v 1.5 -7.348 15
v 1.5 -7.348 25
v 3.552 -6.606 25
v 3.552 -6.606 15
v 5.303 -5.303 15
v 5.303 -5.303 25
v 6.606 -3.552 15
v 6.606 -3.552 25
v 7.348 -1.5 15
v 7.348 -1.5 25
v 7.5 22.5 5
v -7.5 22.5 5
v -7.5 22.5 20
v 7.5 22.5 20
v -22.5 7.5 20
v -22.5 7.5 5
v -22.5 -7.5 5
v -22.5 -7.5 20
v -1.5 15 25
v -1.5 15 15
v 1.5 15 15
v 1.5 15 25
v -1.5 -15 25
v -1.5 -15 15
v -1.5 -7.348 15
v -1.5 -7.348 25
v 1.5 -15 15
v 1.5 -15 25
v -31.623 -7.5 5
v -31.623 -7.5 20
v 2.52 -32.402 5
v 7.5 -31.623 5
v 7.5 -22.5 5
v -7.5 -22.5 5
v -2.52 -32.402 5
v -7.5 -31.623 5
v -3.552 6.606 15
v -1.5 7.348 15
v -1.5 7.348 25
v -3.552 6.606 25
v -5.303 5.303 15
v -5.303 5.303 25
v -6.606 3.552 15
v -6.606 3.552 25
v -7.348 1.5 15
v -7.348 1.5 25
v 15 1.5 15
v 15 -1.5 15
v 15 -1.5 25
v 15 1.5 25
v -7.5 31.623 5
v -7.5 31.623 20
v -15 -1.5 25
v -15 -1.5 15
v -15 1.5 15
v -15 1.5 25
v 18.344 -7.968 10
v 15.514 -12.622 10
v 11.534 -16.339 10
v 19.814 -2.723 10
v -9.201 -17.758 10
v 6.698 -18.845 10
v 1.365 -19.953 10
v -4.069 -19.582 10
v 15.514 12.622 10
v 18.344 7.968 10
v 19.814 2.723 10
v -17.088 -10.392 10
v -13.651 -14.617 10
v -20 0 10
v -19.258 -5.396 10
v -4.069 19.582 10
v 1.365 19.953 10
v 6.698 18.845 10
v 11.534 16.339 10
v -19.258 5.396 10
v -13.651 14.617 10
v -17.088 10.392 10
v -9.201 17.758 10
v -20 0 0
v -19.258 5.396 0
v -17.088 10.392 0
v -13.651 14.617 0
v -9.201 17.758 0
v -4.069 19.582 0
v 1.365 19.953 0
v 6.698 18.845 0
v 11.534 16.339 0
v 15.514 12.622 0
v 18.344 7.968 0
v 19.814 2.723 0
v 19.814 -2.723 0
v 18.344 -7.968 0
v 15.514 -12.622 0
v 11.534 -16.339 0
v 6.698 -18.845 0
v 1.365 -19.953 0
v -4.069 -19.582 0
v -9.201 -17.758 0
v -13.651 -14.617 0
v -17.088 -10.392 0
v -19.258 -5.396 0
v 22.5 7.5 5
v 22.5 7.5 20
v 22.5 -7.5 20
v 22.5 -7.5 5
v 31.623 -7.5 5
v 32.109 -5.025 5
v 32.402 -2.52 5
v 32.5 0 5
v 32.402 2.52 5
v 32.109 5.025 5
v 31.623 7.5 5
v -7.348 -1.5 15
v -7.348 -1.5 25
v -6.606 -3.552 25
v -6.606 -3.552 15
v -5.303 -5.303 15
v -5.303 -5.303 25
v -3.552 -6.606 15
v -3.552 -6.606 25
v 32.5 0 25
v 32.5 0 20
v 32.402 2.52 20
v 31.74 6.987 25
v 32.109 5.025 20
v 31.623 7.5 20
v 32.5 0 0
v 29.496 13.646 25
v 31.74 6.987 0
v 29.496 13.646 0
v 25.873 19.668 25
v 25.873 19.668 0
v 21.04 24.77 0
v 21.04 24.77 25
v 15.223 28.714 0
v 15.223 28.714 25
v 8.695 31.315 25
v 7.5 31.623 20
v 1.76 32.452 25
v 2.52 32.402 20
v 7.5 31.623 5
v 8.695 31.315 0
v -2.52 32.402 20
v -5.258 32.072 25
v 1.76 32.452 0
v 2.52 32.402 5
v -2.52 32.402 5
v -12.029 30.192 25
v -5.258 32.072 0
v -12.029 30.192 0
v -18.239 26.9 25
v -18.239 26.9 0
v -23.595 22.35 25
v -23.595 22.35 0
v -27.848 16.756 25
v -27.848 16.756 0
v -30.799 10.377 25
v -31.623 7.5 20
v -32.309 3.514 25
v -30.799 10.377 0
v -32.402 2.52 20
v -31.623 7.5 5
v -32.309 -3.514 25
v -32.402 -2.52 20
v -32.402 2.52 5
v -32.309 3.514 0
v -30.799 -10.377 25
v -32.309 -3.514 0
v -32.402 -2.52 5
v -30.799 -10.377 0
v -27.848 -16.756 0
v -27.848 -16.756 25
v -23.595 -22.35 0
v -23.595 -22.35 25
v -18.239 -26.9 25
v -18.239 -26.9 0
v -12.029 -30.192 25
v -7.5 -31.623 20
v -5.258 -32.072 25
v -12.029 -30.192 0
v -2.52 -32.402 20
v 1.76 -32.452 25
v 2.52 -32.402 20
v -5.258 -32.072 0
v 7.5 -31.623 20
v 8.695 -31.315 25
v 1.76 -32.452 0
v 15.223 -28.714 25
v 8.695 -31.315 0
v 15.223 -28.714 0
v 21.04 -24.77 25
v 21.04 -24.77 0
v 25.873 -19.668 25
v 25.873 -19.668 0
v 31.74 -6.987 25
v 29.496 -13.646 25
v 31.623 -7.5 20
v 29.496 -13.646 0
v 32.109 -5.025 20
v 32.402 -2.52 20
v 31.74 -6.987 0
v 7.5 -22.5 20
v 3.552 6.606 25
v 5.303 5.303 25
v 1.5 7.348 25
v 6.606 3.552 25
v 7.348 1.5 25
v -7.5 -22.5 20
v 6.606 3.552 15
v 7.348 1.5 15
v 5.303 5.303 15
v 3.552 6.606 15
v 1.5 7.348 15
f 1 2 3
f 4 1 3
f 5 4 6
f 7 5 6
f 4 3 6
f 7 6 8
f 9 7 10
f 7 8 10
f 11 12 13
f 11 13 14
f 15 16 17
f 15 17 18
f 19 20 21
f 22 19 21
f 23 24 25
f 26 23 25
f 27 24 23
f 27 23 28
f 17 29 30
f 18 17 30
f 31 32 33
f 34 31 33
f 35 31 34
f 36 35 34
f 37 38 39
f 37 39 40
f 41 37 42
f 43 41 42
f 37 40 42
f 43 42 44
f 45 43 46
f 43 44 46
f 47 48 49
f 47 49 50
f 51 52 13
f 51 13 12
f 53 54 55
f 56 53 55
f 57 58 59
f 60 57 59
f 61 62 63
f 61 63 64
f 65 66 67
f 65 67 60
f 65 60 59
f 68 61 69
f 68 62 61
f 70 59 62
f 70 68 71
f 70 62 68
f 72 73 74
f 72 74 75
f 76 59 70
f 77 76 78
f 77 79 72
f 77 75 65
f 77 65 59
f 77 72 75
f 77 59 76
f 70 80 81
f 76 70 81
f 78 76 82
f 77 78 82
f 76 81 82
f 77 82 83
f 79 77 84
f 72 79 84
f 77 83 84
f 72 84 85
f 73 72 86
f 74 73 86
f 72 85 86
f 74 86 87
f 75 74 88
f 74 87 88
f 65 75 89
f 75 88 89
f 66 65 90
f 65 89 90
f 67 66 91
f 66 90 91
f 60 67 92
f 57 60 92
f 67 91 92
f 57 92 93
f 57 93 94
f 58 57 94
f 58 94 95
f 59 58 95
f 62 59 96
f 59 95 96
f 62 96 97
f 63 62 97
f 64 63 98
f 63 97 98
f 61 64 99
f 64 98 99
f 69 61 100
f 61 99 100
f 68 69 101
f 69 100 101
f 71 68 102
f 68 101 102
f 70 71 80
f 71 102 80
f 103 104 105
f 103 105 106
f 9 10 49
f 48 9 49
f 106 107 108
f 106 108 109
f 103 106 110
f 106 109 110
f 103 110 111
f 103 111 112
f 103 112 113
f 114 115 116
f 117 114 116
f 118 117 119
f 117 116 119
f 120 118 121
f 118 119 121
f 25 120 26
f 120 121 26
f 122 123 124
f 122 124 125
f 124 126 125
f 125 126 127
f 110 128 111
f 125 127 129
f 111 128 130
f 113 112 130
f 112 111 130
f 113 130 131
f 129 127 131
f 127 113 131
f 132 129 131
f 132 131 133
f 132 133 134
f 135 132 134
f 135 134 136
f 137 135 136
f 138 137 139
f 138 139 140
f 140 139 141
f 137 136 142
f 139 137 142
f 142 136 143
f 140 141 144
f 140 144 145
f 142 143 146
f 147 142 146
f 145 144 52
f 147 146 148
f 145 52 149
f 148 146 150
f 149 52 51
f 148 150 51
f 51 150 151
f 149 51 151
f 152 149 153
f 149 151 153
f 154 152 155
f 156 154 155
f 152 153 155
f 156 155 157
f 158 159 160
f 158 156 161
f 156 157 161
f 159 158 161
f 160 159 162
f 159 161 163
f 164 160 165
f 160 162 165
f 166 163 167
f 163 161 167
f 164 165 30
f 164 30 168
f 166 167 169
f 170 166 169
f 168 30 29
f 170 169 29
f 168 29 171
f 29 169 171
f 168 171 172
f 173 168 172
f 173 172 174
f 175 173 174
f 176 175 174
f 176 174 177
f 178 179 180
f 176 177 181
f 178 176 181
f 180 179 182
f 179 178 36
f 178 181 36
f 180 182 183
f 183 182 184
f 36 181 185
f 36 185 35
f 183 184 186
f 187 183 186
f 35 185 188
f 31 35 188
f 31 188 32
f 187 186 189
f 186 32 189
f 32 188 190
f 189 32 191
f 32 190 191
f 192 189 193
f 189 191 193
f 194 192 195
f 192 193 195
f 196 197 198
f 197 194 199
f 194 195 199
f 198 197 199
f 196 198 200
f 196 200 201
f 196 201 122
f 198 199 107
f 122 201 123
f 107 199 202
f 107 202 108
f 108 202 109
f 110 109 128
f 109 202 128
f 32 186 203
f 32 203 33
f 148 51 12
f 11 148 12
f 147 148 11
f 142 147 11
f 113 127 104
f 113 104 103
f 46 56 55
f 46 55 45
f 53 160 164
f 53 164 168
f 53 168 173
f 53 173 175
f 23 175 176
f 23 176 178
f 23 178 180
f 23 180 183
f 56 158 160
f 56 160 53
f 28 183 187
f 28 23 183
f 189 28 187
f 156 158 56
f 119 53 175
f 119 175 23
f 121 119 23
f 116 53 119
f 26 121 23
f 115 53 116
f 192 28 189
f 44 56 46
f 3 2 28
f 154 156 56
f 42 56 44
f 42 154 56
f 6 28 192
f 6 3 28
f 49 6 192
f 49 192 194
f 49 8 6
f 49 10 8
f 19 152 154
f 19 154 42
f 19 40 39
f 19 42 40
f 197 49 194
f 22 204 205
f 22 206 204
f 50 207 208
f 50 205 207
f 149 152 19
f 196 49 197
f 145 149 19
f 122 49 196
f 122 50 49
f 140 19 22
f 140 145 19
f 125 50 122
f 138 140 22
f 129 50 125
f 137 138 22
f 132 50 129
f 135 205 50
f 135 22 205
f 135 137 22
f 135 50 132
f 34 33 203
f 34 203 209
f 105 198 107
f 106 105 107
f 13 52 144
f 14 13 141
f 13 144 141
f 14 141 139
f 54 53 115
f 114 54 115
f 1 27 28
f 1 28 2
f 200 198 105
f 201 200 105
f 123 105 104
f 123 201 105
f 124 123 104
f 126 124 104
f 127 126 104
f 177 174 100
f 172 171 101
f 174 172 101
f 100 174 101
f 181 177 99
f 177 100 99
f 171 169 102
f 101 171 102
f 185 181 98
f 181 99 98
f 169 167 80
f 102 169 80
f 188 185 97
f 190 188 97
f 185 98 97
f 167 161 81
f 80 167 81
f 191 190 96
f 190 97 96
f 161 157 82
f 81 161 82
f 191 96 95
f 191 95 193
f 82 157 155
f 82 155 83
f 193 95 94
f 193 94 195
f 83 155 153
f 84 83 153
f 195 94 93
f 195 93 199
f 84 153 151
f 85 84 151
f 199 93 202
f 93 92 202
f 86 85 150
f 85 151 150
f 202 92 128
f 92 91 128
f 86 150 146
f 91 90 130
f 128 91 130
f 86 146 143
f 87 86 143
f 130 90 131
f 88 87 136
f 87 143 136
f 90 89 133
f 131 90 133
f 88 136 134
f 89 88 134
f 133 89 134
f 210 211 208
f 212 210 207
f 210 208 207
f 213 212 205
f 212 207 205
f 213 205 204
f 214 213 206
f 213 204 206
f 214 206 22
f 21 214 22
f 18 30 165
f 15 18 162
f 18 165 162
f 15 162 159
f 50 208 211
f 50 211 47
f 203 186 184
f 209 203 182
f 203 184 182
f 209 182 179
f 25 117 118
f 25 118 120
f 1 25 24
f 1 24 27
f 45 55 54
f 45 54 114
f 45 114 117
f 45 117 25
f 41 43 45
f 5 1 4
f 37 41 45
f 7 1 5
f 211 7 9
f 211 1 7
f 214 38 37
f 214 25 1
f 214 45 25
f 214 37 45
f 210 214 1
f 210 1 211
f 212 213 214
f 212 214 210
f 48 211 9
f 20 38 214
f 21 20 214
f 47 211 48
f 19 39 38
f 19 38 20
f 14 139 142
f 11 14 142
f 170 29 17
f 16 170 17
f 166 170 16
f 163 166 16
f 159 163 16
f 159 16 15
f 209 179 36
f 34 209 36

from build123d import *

# Parameters (mm, degrees)
SKETCH1_R           = 32.5
BOSS_EXTRUDE1_DEPTH = 25
SKETCH2_R           = 20
CUT_EXTRUDE1_DEPTH  = 10
SKETCH3_R           = 7.5
SKETCH3_W           = 30
SKETCH3_H           = 3
SKETCH3_W_2         = 3
SKETCH3_H_2         = 30
CUT_EXTRUDE2_DEPTH  = 10
SKETCH4_W           = 15
SKETCH4_H           = 15
CUT_EXTRUDE3_DEPTH  = 10
SKETCH6_W           = 15
SKETCH6_H           = 15
CUT_EXTRUDE4_DEPTH  = 10
SKETCH7_W           = 15
SKETCH7_H           = 15
CUT_EXTRUDE5_DEPTH  = 10
SKETCH8_W           = 15
SKETCH8_H           = 15
CUT_EXTRUDE6_DEPTH  = 10


with BuildPart() as part:
    # Sketch1 → Boss-Extrude1 (new body)
    with BuildSketch(Plane.XY):
        Circle(SKETCH1_R)
    extrude(amount=BOSS_EXTRUDE1_DEPTH)

    # Sketch2 → Cut-Extrude1 (cut)
    with BuildSketch(Plane(origin=(0, 0, 0), x_dir=(-1, 0, 0), z_dir=(0, 0, -1))):
        Circle(SKETCH2_R)
    extrude(amount=-CUT_EXTRUDE1_DEPTH, mode=Mode.SUBTRACT)

    # Sketch3 → Cut-Extrude2 (cut)
    with BuildSketch(Plane.XY.offset(25)):
        Circle(SKETCH3_R)
        Rectangle(SKETCH3_W, SKETCH3_H)
        Rectangle(SKETCH3_W_2, SKETCH3_H_2)
    extrude(amount=-CUT_EXTRUDE2_DEPTH, mode=Mode.SUBTRACT)

    # Sketch4 → Cut-Extrude3 (cut)
    with BuildSketch(Plane(origin=(32.5, 0, 0), x_dir=(0, 0, -1), z_dir=(1, 0, 0))):
        with Locations((-12.5, 0)):
            Rectangle(SKETCH4_W, SKETCH4_H)
    extrude(amount=-CUT_EXTRUDE3_DEPTH, mode=Mode.SUBTRACT)

    # Sketch6 → Cut-Extrude4 (cut)
    with BuildSketch(Plane.ZY.offset(32.5)):
        with Locations((12.5, 0)):
            Rectangle(SKETCH6_W, SKETCH6_H)
    extrude(amount=-CUT_EXTRUDE4_DEPTH, mode=Mode.SUBTRACT)

    # Sketch7 → Cut-Extrude5 (cut)
    with BuildSketch(Plane(origin=(0, 32.5, 0), x_dir=(1, 0, 0), z_dir=(0, 1, 0))):
        with Locations((0, -12.5)):
            Rectangle(SKETCH7_W, SKETCH7_H)
    extrude(amount=-CUT_EXTRUDE5_DEPTH, mode=Mode.SUBTRACT)

    # Sketch8 → Cut-Extrude6 (cut)
    with BuildSketch(Plane(origin=(0, -32.5, 0), x_dir=(-1, 0, 0), z_dir=(0, -1, 0))):
        with Locations((0, -12.5)):
            Rectangle(SKETCH8_W, SKETCH8_H)
    extrude(amount=-CUT_EXTRUDE6_DEPTH, mode=Mode.SUBTRACT)


solid = part.part
